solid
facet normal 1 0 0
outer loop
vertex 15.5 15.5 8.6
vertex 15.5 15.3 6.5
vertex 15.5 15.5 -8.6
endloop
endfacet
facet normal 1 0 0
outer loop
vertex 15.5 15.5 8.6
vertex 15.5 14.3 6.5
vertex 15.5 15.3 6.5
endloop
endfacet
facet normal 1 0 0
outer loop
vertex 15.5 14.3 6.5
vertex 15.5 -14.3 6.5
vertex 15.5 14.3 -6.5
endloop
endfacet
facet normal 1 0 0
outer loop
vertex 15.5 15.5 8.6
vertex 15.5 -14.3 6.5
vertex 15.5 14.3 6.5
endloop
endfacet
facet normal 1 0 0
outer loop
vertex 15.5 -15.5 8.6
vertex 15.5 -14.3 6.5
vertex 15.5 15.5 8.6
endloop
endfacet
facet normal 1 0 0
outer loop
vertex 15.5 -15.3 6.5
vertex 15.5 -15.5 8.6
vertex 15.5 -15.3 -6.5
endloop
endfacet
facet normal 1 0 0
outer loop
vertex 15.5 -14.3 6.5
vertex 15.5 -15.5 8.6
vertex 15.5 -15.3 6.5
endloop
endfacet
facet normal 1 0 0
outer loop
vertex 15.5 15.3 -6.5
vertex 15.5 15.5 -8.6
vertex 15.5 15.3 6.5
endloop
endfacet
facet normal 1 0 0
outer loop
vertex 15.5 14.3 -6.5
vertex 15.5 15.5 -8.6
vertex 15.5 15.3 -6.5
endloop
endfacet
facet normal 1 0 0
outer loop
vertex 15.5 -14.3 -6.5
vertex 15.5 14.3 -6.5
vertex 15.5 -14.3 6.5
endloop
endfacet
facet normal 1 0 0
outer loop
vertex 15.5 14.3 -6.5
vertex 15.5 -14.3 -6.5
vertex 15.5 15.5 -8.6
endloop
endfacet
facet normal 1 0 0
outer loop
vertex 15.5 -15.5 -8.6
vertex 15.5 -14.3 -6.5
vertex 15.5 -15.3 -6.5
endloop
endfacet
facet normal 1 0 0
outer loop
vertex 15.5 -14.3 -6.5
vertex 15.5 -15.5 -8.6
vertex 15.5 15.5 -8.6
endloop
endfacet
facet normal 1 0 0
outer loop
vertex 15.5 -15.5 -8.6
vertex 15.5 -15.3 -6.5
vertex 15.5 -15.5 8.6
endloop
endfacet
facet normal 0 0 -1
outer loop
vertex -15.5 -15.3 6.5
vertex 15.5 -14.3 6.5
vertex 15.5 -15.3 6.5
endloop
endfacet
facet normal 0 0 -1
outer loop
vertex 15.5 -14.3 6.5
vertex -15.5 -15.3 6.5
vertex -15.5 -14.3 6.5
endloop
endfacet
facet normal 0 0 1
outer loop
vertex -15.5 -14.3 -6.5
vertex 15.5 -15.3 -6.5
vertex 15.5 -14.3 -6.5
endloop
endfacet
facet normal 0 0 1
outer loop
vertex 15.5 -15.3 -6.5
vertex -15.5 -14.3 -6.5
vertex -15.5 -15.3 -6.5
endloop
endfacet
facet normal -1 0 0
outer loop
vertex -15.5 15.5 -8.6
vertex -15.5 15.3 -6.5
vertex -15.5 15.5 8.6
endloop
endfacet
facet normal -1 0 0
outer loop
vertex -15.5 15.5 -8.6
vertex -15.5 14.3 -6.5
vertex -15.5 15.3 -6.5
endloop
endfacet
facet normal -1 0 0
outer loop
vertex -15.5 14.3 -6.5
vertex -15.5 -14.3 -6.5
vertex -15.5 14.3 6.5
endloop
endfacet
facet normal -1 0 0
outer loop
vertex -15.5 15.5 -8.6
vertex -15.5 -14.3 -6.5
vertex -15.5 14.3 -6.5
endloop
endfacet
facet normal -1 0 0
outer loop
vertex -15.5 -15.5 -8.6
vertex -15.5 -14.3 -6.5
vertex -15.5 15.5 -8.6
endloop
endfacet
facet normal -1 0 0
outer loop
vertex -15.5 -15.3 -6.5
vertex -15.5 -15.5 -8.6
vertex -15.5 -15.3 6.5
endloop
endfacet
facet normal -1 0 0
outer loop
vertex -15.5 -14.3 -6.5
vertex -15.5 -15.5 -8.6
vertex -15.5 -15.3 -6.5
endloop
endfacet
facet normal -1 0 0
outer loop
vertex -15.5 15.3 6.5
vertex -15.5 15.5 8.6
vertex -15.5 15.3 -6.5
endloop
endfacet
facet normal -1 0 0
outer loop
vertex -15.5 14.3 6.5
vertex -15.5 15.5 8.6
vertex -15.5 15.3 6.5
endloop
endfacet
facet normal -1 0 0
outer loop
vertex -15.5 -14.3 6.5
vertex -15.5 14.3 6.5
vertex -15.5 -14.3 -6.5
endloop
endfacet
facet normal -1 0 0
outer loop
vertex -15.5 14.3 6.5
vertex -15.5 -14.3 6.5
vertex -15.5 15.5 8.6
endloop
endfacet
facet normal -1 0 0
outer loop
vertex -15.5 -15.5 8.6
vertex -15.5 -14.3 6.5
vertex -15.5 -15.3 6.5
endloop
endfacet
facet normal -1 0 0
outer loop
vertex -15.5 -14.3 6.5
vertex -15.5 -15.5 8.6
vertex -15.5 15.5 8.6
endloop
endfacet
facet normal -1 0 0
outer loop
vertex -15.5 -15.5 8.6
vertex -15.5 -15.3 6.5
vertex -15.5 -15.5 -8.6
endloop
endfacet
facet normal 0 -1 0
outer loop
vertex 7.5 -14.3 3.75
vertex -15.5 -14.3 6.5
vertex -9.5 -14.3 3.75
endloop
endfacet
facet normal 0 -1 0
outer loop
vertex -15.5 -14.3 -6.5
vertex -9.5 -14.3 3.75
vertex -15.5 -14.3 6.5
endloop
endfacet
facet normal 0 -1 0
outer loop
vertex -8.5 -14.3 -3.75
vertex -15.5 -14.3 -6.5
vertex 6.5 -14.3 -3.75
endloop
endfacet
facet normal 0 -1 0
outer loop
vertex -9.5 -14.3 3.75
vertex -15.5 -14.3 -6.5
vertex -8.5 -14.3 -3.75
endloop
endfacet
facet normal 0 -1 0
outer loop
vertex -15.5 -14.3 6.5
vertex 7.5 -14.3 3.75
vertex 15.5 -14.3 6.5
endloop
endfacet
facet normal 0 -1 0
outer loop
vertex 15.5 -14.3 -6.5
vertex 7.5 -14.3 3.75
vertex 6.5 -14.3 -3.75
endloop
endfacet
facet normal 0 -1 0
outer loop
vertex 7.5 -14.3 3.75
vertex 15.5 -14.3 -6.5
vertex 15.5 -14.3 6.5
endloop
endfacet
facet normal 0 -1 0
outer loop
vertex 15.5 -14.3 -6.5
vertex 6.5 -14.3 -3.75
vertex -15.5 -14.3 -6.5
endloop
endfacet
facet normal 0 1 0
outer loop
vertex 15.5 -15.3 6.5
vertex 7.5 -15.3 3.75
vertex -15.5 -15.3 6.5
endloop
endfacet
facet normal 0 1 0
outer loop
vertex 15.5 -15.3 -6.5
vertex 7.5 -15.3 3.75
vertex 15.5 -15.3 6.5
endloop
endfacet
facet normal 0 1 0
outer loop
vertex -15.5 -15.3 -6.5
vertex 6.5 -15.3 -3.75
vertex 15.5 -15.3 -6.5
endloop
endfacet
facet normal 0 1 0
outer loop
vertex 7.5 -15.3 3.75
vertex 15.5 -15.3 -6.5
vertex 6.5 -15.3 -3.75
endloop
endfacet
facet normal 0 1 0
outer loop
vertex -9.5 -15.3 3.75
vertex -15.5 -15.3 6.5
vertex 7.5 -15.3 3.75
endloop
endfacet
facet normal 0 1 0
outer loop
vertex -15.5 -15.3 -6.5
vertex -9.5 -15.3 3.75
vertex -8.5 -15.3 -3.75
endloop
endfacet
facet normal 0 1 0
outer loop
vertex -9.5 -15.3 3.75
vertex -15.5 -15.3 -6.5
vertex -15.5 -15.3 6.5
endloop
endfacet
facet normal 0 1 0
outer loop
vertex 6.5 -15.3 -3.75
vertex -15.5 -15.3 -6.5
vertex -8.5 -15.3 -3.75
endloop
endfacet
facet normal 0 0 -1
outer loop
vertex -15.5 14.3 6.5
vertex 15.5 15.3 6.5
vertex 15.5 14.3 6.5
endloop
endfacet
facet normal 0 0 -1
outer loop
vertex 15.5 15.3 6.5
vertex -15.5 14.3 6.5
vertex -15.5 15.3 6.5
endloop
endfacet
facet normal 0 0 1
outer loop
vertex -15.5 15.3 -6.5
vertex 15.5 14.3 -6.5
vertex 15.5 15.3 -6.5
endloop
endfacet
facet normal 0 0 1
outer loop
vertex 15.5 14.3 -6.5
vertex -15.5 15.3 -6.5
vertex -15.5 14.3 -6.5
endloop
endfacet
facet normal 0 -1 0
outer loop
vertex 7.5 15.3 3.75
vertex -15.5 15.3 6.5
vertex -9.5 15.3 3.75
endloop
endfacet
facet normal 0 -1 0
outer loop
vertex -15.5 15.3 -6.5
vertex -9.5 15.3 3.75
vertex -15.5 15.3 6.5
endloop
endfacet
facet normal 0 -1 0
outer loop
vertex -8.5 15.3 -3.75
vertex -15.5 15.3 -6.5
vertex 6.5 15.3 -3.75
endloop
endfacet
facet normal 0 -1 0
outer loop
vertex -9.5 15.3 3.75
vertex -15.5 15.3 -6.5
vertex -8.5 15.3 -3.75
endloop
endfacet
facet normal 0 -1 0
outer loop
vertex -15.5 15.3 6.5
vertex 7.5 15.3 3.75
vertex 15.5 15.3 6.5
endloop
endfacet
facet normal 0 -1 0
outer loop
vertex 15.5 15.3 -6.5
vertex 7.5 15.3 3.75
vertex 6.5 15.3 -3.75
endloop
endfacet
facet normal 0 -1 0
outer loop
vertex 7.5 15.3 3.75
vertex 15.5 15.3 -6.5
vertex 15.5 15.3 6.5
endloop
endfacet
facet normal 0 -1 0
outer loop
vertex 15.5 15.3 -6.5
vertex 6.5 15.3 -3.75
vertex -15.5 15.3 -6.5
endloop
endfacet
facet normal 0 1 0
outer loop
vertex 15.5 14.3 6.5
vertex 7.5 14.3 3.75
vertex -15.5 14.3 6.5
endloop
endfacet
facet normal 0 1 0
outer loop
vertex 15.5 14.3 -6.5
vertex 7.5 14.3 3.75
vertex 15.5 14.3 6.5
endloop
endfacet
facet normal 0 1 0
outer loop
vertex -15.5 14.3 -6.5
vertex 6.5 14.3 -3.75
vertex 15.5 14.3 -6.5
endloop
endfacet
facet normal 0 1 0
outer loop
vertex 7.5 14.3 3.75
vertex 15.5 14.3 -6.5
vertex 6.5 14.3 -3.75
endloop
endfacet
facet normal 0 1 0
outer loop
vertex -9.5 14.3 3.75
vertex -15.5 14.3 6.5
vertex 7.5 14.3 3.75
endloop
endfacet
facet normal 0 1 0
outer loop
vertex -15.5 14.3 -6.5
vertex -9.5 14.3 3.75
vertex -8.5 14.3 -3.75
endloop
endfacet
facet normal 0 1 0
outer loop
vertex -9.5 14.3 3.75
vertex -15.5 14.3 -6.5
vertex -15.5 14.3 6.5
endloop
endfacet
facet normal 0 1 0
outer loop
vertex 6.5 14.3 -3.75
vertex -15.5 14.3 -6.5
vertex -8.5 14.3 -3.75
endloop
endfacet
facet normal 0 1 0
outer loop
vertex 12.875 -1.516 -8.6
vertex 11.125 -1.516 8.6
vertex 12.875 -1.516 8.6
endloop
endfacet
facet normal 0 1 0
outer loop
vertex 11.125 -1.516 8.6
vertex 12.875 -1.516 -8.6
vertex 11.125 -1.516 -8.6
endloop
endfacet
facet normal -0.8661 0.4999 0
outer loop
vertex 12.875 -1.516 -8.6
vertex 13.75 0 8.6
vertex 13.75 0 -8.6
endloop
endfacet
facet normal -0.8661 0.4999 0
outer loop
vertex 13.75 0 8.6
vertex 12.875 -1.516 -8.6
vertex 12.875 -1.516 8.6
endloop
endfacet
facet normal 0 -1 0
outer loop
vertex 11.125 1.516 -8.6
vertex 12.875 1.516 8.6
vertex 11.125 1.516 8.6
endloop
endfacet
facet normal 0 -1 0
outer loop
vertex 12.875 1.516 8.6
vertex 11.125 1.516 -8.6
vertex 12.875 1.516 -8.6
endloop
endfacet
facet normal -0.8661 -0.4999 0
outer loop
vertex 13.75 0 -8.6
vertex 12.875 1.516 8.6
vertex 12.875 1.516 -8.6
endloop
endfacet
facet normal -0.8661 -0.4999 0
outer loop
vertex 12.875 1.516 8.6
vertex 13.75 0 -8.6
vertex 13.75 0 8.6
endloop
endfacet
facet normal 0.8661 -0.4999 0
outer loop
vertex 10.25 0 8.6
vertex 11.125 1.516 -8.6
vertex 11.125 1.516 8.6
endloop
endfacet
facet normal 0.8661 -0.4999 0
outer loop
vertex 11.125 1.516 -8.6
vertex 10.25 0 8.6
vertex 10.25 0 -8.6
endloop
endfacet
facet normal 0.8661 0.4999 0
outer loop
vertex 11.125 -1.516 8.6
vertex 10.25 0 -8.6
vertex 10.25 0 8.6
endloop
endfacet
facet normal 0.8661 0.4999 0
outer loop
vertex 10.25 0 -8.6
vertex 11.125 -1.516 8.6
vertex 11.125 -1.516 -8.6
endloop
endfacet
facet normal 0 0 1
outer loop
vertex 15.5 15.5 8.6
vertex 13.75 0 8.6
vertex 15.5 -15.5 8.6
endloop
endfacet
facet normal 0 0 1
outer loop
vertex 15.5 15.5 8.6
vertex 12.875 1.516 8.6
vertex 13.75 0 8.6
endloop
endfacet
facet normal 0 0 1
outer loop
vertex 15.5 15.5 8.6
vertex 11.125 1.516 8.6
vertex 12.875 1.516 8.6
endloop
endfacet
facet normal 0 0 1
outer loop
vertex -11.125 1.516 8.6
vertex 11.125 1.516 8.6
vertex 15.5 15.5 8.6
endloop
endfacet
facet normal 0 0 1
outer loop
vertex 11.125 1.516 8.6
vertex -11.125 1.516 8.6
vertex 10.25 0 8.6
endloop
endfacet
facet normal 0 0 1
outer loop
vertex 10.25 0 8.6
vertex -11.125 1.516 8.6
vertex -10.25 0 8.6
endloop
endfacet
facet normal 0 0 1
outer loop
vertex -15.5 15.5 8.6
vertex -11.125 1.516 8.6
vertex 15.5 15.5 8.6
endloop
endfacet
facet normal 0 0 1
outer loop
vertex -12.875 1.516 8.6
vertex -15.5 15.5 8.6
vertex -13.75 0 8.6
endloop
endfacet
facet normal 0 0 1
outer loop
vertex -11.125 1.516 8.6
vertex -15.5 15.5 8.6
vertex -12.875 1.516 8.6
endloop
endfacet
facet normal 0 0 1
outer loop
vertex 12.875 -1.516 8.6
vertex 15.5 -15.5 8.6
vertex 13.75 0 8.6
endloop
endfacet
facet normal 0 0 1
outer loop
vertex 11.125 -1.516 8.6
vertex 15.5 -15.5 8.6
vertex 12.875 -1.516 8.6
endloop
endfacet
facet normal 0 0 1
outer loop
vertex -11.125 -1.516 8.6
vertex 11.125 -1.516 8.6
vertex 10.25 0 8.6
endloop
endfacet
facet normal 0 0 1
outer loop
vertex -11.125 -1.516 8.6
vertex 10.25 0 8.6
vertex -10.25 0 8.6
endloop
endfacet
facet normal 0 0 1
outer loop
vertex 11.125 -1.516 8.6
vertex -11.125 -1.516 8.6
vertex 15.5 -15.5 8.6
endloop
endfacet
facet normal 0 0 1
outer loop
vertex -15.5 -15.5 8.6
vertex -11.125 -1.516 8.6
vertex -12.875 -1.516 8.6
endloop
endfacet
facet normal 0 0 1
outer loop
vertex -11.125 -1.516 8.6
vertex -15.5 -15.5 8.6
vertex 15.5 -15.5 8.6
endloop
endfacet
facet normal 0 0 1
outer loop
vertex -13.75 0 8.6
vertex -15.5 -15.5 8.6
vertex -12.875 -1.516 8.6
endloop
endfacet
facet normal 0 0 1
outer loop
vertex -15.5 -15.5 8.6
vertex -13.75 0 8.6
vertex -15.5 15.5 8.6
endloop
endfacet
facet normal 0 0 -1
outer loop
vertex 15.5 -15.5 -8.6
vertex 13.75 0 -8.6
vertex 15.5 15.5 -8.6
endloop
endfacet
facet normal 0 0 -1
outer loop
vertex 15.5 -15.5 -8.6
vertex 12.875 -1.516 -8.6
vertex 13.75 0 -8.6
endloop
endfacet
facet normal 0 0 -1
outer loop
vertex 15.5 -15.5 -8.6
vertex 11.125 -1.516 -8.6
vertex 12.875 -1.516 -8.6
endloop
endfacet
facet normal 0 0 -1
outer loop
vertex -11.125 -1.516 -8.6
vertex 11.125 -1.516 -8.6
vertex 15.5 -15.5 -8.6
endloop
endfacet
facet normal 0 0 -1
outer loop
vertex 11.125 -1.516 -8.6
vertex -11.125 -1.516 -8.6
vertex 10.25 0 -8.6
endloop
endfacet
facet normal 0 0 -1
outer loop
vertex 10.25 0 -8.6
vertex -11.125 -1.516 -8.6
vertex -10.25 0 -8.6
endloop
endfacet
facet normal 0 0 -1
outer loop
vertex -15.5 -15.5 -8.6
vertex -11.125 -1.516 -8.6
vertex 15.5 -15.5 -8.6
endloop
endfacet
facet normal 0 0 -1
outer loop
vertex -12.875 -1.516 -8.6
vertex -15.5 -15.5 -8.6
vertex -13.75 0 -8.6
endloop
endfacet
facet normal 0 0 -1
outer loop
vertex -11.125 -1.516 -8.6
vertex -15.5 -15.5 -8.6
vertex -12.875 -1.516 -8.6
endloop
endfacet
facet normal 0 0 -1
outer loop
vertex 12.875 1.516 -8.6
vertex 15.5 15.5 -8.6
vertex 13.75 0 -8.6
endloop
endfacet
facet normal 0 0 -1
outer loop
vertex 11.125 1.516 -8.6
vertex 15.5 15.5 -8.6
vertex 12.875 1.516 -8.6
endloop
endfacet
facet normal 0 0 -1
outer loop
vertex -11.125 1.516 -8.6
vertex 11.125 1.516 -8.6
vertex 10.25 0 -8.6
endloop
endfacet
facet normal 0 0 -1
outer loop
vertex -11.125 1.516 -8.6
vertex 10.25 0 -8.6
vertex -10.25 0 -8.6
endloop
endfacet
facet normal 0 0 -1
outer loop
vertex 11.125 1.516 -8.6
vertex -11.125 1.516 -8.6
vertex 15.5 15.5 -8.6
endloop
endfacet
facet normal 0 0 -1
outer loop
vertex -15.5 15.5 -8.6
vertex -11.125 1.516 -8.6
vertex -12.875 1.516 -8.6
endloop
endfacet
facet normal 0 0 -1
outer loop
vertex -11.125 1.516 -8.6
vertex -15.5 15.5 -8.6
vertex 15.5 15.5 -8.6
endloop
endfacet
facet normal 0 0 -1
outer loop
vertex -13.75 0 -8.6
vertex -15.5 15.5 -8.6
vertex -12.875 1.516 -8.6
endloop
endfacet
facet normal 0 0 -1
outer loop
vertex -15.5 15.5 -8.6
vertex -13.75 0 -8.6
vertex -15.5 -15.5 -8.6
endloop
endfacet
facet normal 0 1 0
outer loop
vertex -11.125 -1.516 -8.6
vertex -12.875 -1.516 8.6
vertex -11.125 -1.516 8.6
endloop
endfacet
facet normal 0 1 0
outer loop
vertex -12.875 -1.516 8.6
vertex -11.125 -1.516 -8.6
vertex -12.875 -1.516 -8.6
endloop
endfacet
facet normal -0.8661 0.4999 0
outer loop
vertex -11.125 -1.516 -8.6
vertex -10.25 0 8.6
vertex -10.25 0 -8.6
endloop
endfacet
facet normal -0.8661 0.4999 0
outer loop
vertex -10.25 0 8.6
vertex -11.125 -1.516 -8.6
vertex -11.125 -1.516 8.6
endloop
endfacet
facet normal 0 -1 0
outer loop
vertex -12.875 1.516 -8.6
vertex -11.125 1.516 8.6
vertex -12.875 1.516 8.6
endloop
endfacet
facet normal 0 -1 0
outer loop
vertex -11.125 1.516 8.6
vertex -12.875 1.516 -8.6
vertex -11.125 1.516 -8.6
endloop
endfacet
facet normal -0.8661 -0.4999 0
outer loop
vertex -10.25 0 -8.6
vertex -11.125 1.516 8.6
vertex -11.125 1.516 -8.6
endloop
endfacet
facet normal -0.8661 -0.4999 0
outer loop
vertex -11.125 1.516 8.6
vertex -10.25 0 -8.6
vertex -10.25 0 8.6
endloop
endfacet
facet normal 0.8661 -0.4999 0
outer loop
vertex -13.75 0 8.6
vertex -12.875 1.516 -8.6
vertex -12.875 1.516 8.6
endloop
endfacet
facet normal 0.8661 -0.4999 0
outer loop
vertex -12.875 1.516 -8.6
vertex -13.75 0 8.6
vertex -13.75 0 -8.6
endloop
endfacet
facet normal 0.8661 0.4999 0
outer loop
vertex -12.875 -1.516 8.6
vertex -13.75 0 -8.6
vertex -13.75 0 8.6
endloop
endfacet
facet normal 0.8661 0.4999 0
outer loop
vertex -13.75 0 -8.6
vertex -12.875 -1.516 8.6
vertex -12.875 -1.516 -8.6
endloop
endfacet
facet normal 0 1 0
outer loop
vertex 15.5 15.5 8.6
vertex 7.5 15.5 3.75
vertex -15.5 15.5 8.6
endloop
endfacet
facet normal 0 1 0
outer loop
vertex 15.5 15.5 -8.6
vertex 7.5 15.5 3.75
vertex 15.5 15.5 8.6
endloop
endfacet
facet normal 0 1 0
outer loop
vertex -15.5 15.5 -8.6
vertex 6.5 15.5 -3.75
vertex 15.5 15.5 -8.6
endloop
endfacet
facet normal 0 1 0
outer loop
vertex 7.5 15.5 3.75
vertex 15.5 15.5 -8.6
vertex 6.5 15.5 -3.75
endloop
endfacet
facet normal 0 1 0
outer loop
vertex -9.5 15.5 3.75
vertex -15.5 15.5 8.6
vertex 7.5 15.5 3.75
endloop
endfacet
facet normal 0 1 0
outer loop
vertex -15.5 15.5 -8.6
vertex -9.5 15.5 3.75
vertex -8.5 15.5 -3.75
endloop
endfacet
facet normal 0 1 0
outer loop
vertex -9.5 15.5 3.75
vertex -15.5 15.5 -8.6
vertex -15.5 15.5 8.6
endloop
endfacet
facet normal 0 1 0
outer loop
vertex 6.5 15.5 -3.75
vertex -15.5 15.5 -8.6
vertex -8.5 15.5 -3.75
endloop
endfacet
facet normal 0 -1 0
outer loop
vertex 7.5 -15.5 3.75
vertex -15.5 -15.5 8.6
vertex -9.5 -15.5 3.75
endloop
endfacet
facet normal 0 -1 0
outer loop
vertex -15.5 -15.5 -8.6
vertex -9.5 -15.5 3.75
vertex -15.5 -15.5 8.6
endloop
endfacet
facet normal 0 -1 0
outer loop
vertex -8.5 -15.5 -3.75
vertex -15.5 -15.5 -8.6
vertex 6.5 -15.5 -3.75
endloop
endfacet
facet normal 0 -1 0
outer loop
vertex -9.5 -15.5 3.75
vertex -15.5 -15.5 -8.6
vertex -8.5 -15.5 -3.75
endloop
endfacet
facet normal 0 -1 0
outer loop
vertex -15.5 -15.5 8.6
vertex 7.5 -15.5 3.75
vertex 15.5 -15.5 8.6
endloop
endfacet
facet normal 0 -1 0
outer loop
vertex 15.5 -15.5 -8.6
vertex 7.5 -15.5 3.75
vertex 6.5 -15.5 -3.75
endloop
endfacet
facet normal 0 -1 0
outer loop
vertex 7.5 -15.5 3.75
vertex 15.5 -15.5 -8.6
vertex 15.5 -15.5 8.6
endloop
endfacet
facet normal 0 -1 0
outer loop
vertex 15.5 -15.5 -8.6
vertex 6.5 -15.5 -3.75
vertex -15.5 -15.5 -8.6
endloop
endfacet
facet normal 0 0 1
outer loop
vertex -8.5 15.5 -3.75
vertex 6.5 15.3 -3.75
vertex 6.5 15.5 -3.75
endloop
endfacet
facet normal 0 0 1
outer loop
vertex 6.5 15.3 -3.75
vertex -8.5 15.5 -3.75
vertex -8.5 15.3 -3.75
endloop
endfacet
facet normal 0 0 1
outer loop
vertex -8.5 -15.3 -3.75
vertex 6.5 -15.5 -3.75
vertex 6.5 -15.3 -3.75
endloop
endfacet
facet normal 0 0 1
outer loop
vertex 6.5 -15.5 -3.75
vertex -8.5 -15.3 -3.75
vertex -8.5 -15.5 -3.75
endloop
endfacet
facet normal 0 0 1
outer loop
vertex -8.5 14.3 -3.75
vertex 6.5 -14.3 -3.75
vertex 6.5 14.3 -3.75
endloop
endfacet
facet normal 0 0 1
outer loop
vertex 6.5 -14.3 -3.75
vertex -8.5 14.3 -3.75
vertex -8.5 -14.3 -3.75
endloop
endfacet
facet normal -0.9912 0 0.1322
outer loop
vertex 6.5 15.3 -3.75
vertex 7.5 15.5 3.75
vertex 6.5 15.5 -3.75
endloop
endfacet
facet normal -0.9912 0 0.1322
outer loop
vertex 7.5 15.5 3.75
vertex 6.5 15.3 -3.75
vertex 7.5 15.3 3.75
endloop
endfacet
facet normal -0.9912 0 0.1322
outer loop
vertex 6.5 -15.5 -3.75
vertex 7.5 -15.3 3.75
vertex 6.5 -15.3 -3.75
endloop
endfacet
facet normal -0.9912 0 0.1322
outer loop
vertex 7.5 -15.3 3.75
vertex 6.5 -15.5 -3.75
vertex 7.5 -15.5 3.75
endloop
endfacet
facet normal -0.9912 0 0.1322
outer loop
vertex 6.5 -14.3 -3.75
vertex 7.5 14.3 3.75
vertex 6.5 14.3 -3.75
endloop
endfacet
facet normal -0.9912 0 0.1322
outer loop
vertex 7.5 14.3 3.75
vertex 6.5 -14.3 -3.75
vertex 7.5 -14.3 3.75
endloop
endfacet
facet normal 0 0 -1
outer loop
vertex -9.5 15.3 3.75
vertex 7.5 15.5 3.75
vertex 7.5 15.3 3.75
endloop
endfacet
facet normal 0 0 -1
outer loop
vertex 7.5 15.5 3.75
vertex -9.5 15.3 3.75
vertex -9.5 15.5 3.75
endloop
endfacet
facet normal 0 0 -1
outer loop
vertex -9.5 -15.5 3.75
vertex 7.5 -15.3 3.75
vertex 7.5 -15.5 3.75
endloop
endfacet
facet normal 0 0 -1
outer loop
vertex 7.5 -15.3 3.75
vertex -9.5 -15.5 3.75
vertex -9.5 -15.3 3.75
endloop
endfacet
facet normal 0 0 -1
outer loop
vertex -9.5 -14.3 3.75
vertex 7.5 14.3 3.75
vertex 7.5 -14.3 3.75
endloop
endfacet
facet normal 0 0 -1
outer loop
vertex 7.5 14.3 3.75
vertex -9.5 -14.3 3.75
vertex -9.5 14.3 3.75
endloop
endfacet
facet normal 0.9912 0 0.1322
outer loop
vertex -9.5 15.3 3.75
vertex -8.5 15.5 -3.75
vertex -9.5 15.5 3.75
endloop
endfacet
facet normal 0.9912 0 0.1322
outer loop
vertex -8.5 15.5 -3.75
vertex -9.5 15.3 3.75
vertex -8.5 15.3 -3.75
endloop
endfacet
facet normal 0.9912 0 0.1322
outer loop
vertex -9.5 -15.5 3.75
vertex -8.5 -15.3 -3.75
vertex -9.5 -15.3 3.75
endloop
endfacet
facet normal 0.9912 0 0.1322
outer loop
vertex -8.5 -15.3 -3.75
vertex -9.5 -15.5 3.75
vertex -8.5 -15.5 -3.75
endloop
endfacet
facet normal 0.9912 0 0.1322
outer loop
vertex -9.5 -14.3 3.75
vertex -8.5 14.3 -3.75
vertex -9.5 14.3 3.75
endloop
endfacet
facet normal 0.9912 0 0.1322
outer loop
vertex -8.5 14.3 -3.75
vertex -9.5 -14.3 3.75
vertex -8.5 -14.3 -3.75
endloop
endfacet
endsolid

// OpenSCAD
//Extrusion width used when printing
extrusionWidth=.7;


screwDiameter=3.5;

//plug1 dimensions 
plug1Height=7.5;
plug1WidthTop=17;
plug1WidthBottom=15;
plate1Height=13;
plate1Width=31;
plate1Thickness=1;
//plug2 dimensions
plug2Height=9.5;
plug2WidthTop=18;
plug2WidthBottom=17;
plate2Height=13;
plate2Width=31;


module mainBit()
{
//main frame
cube([max(plate1Width,plate2Width),
max(plate1Width,plate2Width),
max(plate1Height,plate2Height)+6*extrusionWidth],true);


}

//mainBit();

module plugCutout()
{
//plug cutout
rotate([90,0,0])
translate([-plug1WidthTop/2,-plug1Height/2,-(plate1Width+10)/2])
{
linear_extrude(height = plate1Width+10)
polygon(points=[[0,0],
[plug1WidthBottom,0],
[plug1WidthBottom-(plug1WidthBottom-plug1WidthTop)/2,plug1Height],
[(plug1WidthBottom-plug1WidthTop)/2,plug1Height]]);
}
}

module plates() 
{
//plates
translate([0,-(plate1Width/2-extrusionWidth),0])
cube([plate1Width,plate1Thickness,plate1Height],true);

translate([0,(plate1Width/2-extrusionWidth),0])
cube([plate1Width,plate1Thickness,plate1Height],true);
}

module screwHoles()
{

	translate([(max(plate1Width,plate2Width)/2-screwDiameter),0,0])
	cylinder(max(plate1Height,plate2Height)+6*extrusionWidth,
	screwDiameter/2,screwDiameter/2,true);

	translate([-(max(plate1Width,plate2Width)/2-screwDiameter),0,0])
	cylinder(max(plate1Height,plate2Height)+6*extrusionWidth,
	screwDiameter/2,screwDiameter/2,true);
}



//put it all together
difference()
{
mainBit();
plugCutout();
plates();
screwHoles();
}
